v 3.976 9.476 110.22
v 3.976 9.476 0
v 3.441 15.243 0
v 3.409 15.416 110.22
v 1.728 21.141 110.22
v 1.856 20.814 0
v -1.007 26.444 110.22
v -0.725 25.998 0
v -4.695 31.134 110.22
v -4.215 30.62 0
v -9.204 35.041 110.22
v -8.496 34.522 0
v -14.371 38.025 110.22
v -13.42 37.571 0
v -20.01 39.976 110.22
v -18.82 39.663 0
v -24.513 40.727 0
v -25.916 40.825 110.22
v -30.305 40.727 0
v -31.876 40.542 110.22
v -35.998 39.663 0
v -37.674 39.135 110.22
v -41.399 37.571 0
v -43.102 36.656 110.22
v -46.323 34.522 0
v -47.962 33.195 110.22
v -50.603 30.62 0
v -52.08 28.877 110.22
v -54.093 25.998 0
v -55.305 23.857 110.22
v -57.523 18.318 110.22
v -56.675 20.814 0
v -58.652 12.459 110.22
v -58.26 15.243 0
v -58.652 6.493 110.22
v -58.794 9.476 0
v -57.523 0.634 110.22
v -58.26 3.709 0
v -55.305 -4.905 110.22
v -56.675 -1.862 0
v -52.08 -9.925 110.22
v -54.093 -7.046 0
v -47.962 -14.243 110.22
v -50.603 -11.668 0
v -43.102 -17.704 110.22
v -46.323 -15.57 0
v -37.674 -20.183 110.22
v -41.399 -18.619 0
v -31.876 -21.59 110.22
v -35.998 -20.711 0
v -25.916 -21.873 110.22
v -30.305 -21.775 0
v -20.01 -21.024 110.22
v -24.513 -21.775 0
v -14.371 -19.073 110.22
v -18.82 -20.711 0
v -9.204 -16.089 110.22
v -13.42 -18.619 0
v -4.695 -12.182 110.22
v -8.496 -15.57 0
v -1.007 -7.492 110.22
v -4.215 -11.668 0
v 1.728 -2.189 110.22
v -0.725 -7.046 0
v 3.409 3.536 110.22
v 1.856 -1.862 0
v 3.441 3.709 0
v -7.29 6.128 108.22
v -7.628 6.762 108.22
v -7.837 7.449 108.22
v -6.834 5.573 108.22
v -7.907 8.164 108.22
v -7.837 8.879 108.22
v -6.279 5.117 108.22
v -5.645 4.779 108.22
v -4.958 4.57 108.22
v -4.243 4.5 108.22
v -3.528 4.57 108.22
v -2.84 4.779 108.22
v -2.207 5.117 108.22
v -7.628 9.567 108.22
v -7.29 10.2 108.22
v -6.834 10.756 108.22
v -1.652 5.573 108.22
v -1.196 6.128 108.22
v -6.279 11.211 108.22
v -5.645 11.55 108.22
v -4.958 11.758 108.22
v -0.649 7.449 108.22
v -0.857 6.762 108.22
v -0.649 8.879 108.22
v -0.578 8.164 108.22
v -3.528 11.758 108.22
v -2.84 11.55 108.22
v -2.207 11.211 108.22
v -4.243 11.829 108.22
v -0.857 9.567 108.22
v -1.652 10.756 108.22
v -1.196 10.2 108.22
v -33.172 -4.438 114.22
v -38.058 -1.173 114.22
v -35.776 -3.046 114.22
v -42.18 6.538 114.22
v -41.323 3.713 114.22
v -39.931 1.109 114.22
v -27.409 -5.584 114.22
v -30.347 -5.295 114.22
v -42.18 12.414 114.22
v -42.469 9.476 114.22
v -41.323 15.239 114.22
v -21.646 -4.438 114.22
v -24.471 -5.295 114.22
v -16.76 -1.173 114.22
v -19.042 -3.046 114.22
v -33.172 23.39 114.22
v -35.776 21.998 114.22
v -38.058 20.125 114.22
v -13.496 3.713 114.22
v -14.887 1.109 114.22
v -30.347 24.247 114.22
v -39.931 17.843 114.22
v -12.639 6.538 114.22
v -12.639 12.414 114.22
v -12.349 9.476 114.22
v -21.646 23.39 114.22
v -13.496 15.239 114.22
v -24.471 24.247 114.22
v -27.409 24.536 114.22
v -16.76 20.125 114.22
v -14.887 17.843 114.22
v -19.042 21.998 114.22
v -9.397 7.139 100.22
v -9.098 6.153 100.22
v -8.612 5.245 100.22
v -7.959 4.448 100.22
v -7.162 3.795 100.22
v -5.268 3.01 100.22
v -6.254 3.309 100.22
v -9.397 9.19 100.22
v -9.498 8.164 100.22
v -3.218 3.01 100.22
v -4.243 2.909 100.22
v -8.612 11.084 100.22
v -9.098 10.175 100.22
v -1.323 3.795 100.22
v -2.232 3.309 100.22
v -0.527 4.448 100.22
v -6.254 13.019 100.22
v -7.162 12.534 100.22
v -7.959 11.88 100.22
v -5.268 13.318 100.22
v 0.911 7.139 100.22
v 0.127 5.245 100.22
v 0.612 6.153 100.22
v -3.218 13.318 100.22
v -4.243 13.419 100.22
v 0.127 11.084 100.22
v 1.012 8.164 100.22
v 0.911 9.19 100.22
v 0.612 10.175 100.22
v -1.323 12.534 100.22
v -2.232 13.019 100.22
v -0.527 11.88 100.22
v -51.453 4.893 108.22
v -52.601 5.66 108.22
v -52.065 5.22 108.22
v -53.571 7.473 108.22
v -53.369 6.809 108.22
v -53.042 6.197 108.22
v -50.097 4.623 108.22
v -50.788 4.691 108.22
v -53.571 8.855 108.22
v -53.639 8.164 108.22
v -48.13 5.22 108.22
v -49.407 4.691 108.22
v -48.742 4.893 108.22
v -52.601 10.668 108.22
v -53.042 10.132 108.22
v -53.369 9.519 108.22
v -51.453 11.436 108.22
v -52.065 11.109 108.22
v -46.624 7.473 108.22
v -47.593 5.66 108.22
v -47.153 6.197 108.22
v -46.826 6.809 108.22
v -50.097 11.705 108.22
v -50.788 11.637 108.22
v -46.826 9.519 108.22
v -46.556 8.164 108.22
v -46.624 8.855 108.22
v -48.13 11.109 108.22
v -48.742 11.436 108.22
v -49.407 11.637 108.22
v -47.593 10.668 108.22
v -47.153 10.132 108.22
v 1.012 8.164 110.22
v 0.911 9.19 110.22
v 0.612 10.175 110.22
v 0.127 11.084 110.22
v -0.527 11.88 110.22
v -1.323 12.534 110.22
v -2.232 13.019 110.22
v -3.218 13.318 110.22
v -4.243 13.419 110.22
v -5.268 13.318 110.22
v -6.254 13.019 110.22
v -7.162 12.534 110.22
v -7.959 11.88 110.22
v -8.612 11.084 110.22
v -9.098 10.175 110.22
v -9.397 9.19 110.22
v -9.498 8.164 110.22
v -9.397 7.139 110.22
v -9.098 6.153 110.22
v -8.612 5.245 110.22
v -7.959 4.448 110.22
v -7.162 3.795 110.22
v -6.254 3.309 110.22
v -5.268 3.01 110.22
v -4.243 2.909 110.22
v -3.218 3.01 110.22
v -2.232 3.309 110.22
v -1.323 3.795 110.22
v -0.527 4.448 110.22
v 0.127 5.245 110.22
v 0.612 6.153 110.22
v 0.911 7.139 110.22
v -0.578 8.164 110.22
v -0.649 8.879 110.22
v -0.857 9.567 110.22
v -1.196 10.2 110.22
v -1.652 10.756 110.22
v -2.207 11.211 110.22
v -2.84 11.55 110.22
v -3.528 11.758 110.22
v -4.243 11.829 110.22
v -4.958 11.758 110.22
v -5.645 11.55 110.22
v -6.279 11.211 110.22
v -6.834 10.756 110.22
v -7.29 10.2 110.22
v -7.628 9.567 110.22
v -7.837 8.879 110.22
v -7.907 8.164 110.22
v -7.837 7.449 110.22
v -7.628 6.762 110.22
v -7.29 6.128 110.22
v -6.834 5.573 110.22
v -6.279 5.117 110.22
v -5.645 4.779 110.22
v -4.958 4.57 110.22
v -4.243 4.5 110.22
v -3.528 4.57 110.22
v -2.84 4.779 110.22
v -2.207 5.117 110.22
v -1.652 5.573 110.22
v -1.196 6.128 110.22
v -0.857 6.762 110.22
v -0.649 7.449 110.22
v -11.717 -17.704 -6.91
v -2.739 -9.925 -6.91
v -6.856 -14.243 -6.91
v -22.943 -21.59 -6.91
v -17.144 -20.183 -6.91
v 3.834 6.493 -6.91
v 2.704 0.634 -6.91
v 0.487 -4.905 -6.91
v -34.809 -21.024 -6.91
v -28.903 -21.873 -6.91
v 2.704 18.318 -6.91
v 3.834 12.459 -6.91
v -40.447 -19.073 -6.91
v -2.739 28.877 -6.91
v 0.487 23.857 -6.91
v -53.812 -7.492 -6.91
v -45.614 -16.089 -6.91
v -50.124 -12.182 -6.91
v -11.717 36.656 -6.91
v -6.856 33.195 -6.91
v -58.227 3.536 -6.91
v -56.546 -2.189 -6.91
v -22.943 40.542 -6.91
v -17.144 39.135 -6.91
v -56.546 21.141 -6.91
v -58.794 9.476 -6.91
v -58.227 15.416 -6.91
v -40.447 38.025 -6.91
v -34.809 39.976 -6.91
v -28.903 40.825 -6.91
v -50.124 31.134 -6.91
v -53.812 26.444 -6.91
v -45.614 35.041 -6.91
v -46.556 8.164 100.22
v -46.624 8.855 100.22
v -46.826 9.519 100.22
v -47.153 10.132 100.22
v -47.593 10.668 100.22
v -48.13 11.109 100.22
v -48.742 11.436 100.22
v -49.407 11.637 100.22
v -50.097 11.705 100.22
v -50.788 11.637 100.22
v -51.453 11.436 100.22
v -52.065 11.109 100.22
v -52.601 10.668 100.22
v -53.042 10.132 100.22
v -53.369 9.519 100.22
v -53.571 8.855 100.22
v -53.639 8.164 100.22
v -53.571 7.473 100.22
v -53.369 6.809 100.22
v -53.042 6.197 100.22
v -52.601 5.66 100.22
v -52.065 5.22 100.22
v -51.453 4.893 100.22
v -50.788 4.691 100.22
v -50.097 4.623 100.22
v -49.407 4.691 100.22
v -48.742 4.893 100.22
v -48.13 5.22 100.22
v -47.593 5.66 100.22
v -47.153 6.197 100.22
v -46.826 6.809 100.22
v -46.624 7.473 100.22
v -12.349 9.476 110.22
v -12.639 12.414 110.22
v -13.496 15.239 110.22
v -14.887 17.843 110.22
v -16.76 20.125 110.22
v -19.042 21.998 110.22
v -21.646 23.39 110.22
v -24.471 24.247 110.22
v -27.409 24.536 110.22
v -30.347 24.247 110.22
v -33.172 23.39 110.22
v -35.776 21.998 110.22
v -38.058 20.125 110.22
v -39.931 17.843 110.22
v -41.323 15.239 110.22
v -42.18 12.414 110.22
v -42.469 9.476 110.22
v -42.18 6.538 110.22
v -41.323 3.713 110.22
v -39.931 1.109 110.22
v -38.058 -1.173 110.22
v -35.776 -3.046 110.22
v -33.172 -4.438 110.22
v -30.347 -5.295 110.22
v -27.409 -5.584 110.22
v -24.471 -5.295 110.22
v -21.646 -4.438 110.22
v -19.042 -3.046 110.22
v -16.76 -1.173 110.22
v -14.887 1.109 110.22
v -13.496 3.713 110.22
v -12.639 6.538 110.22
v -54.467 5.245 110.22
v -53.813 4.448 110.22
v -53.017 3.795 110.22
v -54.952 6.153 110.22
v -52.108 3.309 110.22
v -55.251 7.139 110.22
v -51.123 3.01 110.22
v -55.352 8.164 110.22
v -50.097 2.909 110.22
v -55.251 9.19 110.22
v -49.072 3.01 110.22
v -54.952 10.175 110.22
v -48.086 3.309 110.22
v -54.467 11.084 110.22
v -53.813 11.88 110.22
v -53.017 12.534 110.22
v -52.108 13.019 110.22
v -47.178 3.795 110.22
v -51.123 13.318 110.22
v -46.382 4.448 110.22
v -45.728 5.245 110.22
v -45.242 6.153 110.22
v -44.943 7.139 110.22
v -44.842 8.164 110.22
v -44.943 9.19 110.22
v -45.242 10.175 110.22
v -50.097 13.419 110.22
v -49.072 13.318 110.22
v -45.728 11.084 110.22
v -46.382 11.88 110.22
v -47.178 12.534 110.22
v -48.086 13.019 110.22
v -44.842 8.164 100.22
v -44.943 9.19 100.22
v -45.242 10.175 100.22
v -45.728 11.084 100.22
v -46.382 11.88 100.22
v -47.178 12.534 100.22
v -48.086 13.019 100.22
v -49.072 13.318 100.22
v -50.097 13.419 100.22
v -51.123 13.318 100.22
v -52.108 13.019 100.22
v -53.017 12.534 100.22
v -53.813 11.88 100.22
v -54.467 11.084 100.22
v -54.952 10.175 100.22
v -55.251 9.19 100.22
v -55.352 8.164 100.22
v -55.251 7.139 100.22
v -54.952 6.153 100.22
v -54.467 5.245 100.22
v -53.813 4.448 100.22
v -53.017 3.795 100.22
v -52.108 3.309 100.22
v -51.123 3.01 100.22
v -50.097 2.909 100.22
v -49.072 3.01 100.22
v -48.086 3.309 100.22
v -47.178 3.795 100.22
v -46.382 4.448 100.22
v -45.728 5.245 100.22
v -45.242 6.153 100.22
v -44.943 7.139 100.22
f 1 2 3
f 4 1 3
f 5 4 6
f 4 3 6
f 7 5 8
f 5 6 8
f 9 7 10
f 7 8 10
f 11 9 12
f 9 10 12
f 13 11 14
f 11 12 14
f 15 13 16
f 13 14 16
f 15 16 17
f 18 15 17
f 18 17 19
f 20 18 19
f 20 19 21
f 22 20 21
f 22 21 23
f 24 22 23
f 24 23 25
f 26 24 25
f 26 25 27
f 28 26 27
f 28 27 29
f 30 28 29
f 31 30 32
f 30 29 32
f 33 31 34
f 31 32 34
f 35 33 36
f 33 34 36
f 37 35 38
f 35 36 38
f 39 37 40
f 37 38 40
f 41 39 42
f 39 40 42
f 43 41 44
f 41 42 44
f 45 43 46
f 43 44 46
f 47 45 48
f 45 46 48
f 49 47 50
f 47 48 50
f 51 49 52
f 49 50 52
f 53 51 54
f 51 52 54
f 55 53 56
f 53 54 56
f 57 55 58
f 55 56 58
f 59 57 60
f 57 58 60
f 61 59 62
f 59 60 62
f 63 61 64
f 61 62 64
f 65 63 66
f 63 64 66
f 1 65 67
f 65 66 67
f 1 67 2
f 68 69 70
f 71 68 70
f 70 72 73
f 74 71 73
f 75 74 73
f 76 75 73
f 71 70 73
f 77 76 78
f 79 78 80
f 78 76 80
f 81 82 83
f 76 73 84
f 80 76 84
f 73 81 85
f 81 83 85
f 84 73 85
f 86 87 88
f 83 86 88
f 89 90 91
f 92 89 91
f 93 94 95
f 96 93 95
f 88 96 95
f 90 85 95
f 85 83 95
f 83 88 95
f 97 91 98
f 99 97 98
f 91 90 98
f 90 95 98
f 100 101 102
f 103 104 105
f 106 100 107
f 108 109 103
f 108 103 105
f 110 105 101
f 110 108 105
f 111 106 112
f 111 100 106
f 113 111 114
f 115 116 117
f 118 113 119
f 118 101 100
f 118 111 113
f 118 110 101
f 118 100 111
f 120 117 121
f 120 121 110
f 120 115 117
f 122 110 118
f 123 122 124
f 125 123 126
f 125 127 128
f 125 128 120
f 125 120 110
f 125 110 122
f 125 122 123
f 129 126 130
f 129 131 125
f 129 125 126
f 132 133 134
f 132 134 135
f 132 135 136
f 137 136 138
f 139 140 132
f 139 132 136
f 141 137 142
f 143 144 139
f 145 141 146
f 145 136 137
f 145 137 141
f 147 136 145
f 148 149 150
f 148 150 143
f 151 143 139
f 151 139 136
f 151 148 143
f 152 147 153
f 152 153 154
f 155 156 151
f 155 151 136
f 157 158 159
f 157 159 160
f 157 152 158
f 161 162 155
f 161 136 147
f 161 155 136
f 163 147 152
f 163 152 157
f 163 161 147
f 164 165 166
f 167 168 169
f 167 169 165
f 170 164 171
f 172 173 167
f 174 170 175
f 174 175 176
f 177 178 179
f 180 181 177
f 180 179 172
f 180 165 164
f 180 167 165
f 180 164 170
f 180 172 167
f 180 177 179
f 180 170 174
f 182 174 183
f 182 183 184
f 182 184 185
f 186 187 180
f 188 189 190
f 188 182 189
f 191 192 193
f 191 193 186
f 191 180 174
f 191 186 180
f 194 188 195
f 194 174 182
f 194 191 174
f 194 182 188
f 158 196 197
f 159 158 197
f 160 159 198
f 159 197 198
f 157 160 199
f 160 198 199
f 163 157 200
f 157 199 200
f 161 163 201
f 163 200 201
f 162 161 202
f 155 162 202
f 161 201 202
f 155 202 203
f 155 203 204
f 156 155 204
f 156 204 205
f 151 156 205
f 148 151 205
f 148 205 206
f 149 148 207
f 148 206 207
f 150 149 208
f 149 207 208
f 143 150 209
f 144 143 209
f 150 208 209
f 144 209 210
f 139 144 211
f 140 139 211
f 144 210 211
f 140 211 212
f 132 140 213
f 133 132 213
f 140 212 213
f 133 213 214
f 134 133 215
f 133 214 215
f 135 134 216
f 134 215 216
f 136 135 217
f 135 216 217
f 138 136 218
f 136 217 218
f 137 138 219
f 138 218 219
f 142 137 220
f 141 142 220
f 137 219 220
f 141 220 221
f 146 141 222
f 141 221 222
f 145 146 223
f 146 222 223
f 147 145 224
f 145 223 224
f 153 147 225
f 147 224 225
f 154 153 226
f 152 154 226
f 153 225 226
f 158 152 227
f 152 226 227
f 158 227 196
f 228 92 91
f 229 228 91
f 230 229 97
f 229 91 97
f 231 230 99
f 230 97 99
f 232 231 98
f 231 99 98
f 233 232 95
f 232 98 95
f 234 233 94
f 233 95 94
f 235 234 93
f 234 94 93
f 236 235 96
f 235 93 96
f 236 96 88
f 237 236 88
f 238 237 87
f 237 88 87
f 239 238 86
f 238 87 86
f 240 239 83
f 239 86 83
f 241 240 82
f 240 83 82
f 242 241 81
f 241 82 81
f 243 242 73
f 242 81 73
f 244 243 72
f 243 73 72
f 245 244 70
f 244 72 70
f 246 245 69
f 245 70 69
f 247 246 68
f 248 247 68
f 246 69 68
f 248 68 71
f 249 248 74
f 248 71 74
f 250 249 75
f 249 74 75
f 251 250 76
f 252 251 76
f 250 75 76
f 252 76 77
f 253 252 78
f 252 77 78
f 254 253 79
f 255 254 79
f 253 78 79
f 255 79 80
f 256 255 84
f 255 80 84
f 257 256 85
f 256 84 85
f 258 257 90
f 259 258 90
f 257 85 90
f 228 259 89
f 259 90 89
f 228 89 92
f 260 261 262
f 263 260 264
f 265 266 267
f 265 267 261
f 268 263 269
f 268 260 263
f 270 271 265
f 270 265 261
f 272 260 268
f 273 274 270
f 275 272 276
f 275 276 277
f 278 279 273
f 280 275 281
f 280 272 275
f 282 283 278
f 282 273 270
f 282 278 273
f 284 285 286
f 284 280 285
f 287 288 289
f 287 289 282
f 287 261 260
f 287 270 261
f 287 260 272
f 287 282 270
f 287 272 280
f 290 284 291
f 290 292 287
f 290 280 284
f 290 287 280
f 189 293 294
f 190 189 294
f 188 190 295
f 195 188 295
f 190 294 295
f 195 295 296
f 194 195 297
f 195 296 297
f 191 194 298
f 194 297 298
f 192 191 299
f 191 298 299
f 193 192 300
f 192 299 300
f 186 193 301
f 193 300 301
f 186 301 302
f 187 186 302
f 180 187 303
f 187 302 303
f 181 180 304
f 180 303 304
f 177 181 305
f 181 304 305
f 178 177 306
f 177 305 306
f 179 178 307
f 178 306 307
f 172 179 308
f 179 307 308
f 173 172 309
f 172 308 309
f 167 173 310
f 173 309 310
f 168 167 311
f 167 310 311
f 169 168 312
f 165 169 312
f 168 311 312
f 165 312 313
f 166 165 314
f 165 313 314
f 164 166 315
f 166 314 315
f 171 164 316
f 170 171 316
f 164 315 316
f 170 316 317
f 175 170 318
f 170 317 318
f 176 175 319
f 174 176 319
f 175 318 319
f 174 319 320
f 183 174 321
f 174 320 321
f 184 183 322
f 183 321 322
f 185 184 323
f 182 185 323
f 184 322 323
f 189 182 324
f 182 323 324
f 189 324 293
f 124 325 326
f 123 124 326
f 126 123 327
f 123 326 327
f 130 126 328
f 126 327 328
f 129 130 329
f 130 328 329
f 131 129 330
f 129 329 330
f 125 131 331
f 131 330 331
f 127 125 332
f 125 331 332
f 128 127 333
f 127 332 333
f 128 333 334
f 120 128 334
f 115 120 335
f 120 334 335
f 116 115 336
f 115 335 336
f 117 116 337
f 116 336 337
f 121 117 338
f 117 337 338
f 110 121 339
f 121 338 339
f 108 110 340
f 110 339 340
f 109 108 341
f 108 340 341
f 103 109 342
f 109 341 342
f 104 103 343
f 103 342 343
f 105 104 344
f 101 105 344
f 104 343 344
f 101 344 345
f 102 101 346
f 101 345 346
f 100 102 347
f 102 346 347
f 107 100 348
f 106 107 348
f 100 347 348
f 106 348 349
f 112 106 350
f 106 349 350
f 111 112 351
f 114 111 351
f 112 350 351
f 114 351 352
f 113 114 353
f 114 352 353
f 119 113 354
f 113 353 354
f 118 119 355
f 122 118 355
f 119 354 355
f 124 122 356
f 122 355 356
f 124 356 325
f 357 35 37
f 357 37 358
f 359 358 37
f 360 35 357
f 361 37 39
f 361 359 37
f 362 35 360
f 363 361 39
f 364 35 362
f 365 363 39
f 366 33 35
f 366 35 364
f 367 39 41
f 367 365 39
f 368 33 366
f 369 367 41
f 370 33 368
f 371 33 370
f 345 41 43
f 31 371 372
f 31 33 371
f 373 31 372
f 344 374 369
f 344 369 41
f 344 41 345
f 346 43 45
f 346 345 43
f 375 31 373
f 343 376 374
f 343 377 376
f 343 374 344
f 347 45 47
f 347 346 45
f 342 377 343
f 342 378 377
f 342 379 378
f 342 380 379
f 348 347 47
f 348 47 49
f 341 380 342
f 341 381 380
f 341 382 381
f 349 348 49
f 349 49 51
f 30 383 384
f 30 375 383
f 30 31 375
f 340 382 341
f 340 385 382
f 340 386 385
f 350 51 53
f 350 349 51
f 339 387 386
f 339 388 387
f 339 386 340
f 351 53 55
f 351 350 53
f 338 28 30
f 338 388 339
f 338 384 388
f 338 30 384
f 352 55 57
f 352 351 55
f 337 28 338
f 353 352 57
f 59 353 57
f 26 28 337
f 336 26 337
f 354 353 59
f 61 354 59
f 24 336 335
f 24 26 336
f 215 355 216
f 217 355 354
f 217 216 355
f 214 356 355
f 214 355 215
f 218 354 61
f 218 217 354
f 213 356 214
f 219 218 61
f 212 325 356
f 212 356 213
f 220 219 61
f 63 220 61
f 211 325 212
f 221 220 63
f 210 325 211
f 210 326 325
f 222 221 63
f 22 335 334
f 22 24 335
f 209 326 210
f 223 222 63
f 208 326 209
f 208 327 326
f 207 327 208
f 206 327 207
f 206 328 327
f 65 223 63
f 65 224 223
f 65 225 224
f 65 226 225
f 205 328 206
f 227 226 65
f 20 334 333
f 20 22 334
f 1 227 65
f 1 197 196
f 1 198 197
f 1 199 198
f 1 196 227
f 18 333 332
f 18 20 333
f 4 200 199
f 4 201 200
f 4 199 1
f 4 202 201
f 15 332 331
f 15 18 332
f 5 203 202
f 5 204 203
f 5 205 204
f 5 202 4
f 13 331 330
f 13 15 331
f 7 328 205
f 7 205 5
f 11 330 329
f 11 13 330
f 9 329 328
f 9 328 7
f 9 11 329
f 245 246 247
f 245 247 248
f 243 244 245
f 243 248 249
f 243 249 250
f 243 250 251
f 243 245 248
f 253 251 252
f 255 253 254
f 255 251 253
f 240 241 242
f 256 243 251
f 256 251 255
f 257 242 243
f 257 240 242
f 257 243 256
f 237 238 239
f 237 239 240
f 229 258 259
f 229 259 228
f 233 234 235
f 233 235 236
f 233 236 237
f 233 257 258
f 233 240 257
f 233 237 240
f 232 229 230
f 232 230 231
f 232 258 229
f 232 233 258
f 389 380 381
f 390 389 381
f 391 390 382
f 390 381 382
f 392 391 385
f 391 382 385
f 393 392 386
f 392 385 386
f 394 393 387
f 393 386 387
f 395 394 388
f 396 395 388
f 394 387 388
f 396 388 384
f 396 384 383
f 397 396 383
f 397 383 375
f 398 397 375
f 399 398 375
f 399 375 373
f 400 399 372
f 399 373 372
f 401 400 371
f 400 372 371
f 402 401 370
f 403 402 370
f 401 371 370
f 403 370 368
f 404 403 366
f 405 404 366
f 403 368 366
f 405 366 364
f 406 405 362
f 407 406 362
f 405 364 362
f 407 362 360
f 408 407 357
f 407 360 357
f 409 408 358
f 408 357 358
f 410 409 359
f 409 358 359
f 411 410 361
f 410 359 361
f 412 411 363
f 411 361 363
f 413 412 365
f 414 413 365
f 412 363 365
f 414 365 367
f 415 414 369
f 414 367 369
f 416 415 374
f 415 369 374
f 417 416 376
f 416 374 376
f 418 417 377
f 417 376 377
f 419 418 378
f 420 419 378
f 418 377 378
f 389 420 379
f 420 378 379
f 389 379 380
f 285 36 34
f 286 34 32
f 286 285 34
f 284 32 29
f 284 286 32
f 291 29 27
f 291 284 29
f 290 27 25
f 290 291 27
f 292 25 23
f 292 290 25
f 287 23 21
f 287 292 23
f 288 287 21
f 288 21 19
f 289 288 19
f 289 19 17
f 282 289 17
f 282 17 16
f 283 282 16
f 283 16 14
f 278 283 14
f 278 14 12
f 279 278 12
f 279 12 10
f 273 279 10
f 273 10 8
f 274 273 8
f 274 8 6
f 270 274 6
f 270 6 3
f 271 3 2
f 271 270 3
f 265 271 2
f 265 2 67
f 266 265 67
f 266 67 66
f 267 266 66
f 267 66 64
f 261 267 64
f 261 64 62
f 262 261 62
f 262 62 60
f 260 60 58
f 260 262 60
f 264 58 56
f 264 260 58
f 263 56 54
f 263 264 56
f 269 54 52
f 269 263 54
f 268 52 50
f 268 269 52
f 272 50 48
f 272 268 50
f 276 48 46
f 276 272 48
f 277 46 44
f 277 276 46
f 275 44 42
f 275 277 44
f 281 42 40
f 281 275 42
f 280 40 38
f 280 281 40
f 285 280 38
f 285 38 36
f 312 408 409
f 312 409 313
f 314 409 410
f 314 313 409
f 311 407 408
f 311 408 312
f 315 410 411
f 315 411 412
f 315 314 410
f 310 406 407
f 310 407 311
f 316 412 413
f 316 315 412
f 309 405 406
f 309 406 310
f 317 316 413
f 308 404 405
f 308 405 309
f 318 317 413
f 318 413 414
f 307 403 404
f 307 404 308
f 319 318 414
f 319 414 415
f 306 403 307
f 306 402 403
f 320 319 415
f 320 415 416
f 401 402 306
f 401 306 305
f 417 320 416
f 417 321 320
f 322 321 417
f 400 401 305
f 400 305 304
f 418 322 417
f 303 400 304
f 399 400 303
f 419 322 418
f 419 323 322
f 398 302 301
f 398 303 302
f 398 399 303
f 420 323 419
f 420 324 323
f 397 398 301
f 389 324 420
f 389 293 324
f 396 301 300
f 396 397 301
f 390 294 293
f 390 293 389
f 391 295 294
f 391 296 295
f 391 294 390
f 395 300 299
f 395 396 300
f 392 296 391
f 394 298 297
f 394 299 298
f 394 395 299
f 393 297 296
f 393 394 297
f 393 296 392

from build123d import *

# Parameters (mm, degrees)
SKETCH_1_R          = 31.385
EXTRUDE_1_DEPTH     = 110.22
SKETCH_2_R          = 15.06
EXTRUDE_2_DEPTH     = 4
SKETCH_3_R          = 5.255
CUT_EXTRUDE_1_DEPTH = 10
SKETCH_4_R          = 3.541157085
EXTRUDE_3_DEPTH     = 8
SKETCH_5_R          = 3.664484838
EXTRUDE_6_DEPTH     = 2
EXTRUDE_START       = 6.91
SKETCH_6_R          = 31.385
EXTRUDE_7_DEPTH     = 6.91


with BuildPart() as part:
    # 草图1 → 凸台-拉伸1 (new body)
    with BuildSketch(Plane.XY):
        with Locations((-27.409245033, 9.476020806)):
            Circle(SKETCH_1_R)
    extrude(amount=EXTRUDE_1_DEPTH)

    # 草图2 → 凸台-拉伸2 (add)
    with BuildSketch(Plane.XY.offset(110.22)):
        with Locations((-27.409245033, 9.476020806)):
            Circle(SKETCH_2_R)
    extrude(amount=EXTRUDE_2_DEPTH)

    # 草图3 → 切除-拉伸1 (cut)
    with BuildSketch(Plane.XY.offset(110.22)):
        with Locations((-4.242782438, 8.164318367)):
            Circle(SKETCH_3_R)
        with Locations((-50.097416885, 8.164318367)):
            Circle(SKETCH_3_R)
    extrude(amount=-CUT_EXTRUDE_1_DEPTH, mode=Mode.SUBTRACT)

    # 草图4 → 凸台-拉伸3 (add)
    with BuildSketch(Plane.XY.offset(100.22)):
        with Locations((-50.097416885, 8.164318367)):
            Circle(SKETCH_4_R)
    extrude(amount=EXTRUDE_3_DEPTH)

    # 草图6 → 凸台-拉伸7 (add)
    with BuildSketch(Plane(origin=(0, 0, 0), x_dir=(-1, 0, 0), z_dir=(0, 0, -1)).offset(EXTRUDE_START)):
        with Locations((27.409245033, 9.476020806)):
            Circle(SKETCH_6_R)
    extrude(amount=-EXTRUDE_7_DEPTH)


with BuildPart() as body_2:
    # 草图5 → 凸台-拉伸6 (new body)
    with BuildSketch(Plane.XY.offset(108.22)):
        with Locations((-4.242782438, 8.164318367)):
            Circle(SKETCH_5_R)
    extrude(amount=EXTRUDE_6_DEPTH)


solid = Compound([part.part, body_2.part])
